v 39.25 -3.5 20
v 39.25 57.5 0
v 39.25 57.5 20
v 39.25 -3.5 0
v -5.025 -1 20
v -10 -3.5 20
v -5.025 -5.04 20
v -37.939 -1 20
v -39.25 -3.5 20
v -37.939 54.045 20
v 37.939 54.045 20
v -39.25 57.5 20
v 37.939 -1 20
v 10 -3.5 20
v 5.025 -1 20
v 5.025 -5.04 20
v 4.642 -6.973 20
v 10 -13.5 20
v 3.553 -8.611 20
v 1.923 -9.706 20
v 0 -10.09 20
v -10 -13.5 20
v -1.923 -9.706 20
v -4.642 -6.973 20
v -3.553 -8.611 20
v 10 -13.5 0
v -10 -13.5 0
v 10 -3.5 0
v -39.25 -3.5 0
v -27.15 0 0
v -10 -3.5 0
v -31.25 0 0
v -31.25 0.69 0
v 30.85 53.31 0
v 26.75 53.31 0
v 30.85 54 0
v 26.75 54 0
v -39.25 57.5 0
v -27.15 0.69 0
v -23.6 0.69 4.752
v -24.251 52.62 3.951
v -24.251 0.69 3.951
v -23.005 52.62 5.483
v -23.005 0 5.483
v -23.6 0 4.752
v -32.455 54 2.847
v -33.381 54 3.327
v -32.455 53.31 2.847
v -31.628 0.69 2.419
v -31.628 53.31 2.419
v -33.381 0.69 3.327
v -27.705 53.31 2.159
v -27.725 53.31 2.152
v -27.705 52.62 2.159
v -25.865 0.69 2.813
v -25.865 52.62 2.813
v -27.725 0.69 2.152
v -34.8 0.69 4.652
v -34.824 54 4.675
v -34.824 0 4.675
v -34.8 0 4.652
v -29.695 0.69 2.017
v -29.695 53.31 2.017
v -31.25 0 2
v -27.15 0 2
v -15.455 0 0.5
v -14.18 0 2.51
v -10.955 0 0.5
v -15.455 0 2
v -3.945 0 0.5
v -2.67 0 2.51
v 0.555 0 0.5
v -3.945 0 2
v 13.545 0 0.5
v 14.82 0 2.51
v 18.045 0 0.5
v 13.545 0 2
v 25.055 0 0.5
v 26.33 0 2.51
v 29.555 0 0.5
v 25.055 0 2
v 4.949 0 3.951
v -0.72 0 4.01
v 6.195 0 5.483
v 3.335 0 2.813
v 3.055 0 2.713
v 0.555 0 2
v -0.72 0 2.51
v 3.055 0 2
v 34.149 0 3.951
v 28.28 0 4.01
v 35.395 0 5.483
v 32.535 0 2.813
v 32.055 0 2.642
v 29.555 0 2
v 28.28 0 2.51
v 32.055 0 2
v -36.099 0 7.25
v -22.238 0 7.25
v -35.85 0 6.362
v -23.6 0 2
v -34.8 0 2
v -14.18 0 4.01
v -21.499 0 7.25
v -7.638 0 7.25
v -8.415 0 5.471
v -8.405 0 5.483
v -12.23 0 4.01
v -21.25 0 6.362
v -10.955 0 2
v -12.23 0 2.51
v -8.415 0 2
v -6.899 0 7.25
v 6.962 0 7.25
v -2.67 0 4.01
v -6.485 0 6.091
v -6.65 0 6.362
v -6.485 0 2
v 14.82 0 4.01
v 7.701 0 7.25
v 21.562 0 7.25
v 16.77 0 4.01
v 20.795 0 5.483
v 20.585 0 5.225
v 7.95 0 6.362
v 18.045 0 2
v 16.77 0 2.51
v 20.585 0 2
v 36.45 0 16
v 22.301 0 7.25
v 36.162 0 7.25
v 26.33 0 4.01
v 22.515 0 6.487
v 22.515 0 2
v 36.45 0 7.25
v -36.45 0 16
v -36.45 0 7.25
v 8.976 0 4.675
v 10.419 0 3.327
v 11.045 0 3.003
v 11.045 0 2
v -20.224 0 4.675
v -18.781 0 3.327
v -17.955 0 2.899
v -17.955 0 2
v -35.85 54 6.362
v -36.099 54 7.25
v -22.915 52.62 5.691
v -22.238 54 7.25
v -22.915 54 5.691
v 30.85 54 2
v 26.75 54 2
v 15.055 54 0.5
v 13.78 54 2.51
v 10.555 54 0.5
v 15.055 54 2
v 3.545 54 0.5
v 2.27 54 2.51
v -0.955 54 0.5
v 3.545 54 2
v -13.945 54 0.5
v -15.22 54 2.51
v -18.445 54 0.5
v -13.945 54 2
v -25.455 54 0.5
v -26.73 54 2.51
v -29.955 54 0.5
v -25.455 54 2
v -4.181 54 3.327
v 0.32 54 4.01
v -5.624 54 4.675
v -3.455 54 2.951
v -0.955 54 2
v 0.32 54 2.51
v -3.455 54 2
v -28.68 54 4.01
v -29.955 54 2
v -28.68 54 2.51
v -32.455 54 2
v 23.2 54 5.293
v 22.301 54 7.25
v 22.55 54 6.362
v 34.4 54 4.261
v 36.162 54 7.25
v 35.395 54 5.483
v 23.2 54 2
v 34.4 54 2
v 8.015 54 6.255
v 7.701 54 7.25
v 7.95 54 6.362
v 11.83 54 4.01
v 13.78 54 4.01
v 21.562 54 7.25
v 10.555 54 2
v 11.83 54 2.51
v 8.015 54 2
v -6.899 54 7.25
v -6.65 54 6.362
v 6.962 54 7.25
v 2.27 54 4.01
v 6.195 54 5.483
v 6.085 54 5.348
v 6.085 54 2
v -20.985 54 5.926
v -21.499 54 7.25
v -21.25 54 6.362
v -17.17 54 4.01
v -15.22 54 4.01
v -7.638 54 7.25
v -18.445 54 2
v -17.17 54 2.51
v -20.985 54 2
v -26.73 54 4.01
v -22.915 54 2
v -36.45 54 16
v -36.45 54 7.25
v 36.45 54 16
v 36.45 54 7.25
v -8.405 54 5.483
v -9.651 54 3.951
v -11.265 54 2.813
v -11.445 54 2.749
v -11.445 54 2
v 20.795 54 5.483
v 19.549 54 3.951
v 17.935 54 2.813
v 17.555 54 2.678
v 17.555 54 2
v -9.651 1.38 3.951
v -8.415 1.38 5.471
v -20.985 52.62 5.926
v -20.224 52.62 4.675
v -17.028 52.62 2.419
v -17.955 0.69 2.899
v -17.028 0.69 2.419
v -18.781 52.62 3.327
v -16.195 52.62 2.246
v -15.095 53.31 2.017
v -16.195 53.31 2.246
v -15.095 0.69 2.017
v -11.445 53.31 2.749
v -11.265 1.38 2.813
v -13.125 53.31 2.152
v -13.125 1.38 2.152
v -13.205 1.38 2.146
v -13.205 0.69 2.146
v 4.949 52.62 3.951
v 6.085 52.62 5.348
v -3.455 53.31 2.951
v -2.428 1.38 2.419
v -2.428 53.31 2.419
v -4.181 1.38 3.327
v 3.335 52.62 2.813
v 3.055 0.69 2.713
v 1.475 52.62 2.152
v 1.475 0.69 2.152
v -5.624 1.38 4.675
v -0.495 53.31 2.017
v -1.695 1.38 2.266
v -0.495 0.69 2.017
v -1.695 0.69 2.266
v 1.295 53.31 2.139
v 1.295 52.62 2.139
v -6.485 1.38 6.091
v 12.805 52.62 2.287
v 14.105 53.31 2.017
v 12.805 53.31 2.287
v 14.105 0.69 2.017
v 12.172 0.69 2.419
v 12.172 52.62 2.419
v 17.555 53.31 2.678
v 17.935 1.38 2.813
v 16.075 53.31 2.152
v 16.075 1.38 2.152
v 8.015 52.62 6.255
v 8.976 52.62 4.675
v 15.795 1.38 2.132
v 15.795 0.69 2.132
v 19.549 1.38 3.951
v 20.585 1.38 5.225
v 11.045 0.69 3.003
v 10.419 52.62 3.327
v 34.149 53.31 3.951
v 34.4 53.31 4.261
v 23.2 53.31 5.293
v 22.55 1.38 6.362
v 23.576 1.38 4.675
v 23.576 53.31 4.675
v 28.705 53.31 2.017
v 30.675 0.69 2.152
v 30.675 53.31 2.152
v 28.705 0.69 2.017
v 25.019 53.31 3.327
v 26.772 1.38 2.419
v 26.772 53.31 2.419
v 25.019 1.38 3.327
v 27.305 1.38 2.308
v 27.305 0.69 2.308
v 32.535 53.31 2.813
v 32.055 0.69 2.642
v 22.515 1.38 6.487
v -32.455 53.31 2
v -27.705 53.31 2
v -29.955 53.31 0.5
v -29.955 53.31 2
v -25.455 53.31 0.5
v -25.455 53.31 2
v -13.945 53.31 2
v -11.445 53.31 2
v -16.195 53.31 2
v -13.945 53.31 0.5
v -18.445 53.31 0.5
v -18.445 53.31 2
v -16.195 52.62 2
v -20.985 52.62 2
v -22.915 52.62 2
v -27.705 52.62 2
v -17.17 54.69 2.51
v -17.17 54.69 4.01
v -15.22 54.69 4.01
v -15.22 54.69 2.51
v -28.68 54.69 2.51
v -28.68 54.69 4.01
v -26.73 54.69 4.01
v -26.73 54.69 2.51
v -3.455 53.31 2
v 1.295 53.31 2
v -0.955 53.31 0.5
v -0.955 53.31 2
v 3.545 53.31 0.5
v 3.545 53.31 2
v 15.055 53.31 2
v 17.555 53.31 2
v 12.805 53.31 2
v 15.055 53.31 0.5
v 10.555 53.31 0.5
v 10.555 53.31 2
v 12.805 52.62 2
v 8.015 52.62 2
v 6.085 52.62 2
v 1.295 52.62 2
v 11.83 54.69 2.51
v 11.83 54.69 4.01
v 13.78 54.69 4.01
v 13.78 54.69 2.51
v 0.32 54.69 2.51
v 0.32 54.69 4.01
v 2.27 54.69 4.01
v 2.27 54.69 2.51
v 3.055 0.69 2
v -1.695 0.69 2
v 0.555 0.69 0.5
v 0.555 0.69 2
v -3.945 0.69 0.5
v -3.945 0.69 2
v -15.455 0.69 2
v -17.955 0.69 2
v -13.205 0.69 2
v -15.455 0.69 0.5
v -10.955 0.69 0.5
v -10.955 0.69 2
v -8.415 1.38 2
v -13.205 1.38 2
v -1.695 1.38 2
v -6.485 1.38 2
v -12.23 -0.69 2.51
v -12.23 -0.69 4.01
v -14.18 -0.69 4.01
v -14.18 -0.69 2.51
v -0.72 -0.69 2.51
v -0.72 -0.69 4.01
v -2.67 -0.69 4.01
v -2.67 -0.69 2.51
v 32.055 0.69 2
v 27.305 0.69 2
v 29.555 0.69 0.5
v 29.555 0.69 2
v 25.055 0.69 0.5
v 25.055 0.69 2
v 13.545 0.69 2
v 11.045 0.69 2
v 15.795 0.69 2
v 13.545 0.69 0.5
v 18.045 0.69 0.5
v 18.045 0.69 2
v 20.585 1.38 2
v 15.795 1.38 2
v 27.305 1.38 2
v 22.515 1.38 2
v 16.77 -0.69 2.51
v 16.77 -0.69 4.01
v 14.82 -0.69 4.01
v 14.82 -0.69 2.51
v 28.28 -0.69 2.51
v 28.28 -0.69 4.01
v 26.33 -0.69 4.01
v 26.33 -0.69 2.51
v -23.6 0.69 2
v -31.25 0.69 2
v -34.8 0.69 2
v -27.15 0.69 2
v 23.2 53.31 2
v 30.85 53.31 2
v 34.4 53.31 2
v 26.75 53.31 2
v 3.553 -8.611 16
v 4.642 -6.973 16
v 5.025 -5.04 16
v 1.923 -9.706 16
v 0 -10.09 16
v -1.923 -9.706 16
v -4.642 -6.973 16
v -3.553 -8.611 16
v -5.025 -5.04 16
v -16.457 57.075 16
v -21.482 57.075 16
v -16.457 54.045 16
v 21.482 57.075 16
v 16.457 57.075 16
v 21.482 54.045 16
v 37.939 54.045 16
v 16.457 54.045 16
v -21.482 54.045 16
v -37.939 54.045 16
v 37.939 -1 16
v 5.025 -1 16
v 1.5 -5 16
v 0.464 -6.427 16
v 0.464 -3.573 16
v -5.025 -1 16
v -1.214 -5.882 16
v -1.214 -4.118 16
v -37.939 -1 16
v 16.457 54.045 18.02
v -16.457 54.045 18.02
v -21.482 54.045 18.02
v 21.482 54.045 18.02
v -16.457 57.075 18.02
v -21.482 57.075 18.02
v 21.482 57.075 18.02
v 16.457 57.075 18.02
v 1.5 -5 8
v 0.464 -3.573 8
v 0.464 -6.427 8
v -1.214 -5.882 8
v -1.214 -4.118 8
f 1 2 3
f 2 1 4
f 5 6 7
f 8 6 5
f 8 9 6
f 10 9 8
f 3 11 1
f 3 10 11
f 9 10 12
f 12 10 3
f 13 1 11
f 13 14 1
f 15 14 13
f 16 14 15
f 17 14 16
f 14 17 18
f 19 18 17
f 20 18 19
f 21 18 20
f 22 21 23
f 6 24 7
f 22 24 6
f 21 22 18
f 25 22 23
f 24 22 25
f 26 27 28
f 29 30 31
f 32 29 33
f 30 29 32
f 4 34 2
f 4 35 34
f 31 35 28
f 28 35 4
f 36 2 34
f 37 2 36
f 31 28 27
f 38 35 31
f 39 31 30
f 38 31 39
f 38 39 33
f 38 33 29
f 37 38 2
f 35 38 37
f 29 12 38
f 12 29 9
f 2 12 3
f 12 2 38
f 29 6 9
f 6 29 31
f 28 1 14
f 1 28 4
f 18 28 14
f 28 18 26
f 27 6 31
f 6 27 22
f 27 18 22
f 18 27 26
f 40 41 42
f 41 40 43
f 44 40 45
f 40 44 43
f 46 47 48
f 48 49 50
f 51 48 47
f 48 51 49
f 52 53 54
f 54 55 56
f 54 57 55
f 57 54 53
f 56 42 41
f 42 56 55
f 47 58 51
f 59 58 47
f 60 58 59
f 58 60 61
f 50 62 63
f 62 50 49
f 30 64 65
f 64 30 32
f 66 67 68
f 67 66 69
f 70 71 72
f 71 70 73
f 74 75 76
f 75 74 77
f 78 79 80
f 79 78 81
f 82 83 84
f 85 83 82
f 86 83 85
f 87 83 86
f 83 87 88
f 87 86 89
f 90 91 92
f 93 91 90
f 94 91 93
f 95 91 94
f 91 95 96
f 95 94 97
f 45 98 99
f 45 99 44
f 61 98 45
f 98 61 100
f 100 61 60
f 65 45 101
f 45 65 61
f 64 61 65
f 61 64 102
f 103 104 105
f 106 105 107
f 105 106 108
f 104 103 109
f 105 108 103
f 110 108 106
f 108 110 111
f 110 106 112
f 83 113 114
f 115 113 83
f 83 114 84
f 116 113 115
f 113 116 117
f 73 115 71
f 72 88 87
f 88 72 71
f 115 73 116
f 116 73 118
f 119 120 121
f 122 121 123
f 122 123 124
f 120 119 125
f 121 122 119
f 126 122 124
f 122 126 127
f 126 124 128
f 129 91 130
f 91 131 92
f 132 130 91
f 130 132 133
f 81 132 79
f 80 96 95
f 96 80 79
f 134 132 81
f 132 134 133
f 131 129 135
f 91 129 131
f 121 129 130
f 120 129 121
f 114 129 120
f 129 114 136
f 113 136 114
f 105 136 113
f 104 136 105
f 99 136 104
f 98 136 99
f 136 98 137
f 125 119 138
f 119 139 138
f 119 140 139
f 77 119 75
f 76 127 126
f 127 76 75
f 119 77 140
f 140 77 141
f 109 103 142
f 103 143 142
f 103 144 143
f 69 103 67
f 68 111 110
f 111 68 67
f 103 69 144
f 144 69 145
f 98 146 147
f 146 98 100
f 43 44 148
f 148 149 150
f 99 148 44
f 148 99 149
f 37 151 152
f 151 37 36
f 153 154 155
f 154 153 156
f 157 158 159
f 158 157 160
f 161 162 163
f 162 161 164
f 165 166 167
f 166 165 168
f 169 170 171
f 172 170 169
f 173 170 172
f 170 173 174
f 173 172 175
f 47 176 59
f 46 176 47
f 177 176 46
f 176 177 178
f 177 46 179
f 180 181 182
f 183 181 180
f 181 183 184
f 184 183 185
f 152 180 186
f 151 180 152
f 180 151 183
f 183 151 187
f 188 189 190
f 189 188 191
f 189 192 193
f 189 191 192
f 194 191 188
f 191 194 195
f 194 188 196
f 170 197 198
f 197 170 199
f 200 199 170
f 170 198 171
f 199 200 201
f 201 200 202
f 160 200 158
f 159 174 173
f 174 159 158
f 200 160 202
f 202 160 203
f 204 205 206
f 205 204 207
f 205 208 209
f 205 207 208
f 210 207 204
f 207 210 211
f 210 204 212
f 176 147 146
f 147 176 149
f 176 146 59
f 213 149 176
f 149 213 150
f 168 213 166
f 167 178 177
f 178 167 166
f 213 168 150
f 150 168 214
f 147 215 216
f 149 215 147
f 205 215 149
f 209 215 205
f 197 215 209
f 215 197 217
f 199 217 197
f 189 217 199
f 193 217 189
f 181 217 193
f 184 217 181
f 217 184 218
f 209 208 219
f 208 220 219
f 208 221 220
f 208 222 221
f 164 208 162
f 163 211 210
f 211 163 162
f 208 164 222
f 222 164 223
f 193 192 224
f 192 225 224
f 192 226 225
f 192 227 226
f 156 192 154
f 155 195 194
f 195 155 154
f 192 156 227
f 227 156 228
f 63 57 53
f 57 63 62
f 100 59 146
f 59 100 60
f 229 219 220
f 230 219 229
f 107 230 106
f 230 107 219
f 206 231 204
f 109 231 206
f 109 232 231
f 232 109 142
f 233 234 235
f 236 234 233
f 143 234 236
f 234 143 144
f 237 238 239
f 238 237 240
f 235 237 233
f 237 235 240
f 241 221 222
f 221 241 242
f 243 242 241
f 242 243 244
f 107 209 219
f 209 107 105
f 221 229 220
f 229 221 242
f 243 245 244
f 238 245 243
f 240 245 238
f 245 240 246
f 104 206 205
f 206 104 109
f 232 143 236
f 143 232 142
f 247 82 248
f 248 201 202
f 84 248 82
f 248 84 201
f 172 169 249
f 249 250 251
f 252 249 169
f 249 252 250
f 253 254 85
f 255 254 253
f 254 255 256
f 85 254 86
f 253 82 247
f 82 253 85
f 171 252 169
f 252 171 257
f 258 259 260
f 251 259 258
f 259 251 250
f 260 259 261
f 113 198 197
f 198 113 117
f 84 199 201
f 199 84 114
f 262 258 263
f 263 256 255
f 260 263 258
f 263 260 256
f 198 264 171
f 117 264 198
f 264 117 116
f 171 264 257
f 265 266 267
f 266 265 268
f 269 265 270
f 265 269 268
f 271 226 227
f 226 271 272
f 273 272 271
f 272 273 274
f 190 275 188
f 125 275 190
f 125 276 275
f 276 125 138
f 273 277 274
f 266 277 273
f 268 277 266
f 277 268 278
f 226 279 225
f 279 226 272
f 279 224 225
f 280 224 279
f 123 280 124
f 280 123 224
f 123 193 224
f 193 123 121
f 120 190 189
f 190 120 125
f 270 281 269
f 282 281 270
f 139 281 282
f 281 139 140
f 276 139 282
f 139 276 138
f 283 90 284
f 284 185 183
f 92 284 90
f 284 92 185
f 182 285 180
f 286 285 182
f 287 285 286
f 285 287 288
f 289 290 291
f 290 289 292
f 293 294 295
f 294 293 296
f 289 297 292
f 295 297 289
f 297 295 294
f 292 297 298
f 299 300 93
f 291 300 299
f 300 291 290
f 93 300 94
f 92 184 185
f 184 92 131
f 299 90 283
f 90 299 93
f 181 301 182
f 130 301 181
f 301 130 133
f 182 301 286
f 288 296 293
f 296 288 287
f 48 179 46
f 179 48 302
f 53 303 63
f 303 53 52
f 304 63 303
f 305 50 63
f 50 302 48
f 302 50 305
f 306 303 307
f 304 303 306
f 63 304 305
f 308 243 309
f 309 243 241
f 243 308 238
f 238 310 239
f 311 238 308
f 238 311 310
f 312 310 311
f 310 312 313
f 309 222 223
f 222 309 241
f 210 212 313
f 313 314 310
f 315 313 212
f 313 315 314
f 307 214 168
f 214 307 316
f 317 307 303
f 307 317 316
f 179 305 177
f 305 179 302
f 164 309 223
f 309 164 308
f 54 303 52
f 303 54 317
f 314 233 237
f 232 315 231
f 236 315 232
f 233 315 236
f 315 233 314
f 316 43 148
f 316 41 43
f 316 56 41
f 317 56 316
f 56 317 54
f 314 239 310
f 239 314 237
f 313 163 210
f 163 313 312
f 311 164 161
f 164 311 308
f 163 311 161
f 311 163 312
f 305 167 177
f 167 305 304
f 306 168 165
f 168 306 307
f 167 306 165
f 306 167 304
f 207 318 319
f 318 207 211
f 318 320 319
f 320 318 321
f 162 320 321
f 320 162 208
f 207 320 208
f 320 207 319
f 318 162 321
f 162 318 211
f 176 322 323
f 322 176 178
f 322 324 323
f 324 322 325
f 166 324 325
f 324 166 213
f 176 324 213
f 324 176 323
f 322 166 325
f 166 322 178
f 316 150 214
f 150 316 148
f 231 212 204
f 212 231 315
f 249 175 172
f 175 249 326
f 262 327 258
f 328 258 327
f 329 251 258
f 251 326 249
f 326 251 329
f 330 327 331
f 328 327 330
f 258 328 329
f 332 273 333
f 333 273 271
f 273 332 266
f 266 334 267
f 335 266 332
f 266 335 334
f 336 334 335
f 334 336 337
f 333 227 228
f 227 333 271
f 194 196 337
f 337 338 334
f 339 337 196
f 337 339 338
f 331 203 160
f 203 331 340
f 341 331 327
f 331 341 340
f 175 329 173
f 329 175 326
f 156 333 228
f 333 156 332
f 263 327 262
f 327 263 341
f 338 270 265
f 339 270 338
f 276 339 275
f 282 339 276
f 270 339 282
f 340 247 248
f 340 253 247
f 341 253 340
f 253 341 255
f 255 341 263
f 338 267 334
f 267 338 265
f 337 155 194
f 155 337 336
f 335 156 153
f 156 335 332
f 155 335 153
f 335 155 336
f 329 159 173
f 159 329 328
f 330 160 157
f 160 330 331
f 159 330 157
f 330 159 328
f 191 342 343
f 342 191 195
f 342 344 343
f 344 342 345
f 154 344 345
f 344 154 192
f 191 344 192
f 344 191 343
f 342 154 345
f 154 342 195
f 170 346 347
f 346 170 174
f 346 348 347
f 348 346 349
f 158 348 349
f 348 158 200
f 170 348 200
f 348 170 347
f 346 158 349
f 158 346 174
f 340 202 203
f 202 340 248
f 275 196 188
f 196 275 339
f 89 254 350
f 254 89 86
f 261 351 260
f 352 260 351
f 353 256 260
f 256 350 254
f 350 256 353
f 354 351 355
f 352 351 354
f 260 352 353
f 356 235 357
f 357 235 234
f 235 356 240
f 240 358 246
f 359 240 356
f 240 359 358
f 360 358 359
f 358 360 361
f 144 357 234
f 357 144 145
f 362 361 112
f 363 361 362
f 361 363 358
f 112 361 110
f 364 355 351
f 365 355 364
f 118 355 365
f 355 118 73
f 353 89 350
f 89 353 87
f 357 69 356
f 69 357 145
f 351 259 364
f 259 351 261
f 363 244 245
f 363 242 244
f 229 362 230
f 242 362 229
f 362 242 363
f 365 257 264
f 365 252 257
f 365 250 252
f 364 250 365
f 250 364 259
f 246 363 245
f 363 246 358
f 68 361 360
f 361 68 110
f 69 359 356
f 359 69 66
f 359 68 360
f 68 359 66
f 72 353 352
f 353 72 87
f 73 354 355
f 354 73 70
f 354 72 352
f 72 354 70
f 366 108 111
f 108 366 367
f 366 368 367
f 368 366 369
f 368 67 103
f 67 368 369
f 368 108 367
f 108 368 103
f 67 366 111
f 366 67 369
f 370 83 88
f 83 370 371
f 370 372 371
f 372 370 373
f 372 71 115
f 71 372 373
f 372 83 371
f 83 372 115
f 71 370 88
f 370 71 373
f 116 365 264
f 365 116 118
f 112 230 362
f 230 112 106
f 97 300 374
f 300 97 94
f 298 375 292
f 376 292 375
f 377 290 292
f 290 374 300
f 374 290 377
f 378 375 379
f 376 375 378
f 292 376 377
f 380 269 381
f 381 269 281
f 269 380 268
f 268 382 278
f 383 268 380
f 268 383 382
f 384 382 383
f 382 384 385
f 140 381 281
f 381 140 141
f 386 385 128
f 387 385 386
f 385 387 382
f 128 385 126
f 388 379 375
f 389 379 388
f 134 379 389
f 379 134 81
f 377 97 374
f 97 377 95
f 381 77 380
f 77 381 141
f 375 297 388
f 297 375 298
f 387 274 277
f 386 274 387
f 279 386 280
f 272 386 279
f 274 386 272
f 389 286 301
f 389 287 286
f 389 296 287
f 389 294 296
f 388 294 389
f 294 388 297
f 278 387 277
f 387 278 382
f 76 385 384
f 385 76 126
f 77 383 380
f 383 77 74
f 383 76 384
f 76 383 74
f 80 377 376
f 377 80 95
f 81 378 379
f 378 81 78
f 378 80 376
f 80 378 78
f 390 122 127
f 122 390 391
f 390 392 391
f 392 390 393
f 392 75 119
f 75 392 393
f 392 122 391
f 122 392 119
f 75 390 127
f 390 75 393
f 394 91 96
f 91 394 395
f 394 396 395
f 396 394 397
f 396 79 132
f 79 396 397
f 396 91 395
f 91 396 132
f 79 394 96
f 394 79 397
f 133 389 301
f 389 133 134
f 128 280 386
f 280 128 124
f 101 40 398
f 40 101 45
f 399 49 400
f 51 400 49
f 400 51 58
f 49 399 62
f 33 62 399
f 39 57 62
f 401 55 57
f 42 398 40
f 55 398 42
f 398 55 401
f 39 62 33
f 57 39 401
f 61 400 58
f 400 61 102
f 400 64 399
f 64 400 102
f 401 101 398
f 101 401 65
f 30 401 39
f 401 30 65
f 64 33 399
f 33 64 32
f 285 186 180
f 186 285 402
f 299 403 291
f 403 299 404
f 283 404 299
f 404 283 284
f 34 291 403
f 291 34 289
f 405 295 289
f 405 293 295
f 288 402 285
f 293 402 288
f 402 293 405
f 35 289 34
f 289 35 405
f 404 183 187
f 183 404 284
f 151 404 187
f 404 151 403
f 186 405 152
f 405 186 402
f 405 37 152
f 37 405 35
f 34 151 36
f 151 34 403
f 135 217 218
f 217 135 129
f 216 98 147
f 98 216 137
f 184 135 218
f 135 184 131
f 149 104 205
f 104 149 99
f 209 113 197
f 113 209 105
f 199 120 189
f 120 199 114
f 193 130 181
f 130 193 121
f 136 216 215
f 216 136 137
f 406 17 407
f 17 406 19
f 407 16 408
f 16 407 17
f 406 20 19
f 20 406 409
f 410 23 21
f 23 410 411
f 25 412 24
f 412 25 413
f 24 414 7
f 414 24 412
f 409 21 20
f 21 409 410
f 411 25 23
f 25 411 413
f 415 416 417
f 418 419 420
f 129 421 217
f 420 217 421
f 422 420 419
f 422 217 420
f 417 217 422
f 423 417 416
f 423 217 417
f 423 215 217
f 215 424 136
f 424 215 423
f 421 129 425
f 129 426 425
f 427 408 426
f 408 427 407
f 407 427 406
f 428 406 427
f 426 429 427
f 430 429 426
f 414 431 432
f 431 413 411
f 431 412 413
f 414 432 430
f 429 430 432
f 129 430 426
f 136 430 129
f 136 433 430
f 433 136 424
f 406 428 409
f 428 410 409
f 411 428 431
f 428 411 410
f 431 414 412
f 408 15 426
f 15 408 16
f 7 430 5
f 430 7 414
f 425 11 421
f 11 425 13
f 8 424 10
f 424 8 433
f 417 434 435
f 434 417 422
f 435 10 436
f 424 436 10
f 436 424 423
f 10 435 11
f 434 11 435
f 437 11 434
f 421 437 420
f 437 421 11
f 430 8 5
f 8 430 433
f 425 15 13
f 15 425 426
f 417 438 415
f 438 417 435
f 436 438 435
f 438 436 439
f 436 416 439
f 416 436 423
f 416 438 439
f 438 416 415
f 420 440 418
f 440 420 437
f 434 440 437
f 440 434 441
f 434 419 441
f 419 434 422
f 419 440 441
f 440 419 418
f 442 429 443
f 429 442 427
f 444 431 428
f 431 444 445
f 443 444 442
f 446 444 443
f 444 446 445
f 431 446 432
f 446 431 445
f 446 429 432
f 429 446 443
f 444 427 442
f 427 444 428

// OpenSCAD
// file: ../libraries/BatteryContacts.scad
/**
 * Digikey Battery Contact Part: 5214K-ND
 * http://www.keyelco.com/product-pdf.cfm?p=894
 */
module BatteryDualContact()
{
	// Overall Properties
	thickness = .69;

	// Lower Tabs
	bottomTabHeight = 1.5;
	bottomTabWidth = 4.50;
	bottomTabDistanceFromCenter = 11.51/2;

	// Body
	overallHeight = 11;
	overallWidth = 21.01;
	mainBodyHeight = overallHeight - bottomTabHeight;


	// Middle Cut
	middleCutWidth = 1.93;
	middleCutHeight = 7.01 - bottomTabHeight;

	// Contacts
	contactDiameter = 5.5;
	contactFromBottom = 7.49 - bottomTabHeight;
	contactFromCenter = 11.51/2;

	// Noch
	nochWidth = 1.95;
	nochHeight = 1.5;
	nochThickness = thickness;
	nochFromCenter = contactFromCenter;
	nochFromBottom = 3.51-bottomTabHeight;

	difference()
	{
		union()
		{
			// Main Body
			translate([-overallWidth/2, 0,0])
				cube([overallWidth, mainBodyHeight,thickness]);
			
			translate([-bottomTabDistanceFromCenter,0,nochThickness])
				cube([bottomTabDistanceFromCenter*2,middleCutHeight, nochThickness]);

			// Bottom Tabs
			translate([-bottomTabWidth/2 - bottomTabDistanceFromCenter,-bottomTabHeight,0])
				cube([bottomTabWidth, bottomTabHeight, thickness]);
			translate([-bottomTabWidth/2 + bottomTabDistanceFromCenter,-bottomTabHeight,0])
				cube([bottomTabWidth, bottomTabHeight, thickness]);

			// Negative Contact
			translate([-contactFromCenter,contactFromBottom,0])
				cylinder(d=contactDiameter, 7.6);

			// Postiive Contact
			translate([contactFromCenter,contactFromBottom,0])
				cylinder(d=contactDiameter, 1.52);

			// Mount Noche
			translate([-nochWidth/2 - nochFromCenter, nochFromBottom-nochHeight, -nochThickness])
				cube([nochWidth, nochHeight, nochThickness]);
			translate([-nochWidth/2 + nochFromCenter, nochFromBottom-nochHeight, -nochThickness])
				cube([nochWidth, nochHeight, nochThickness]);

		}
		
		// Middle Cut
		translate([-middleCutWidth/2,0,0])
			cube([middleCutWidth, middleCutHeight,thickness+nochThickness]);
	}
}

//BatteryDualContact();

/**
 * Digikey Battery Contact Part: 5211K-ND
 * http://www.digikey.com/product-detail/en/5211/5211K-ND/316370
 */
module BatteryDualContactTab()
{
	overallHeight = 18.49;
	thickness = .69;
	tabDiameter = 4.1;
	mainBodyHeight = 11.99;
	tabRectangleHeight = overallHeight - mainBodyHeight - (tabDiameter/2);

	difference()
	{
		union()
		{
			translate([-23.01/2, 0,0])
				cube([23.01, mainBodyHeight,thickness]);
			translate([-tabDiameter/2,-tabRectangleHeight,0])
				cube([tabDiameter, tabRectangleHeight, thickness]);
			translate([0,-tabRectangleHeight,0])
				cylinder(d=tabDiameter,thickness);

			// Negative Contact
			translate([-7,mainBodyHeight-4.5,0])
				cylinder(d=6, 10.52);

			// Postiive Contact
			translate([7,mainBodyHeight-4.5,0])
				cylinder(d=6, 2);
		}
		translate([7,mainBodyHeight-4.5-5.74,0])
			cylinder(d=2.4, 2);
	}
}

//BatteryDualContactTab();

/**
 * Digikey Parts: 5201K-ND and 5223K-ND
 * http://www.keyelco.com/product-pdf.cfm?p=910
 */
module BatterySingleContact()
{
	overallHeight = 18.49;
	thickness = .69;
	tabDiameter = 4.1;
	mainBodyHeight = 11.99;
	tabRectangleHeight = overallHeight - mainBodyHeight - (tabDiameter/2);

	difference()
	{
		union()
		{
			translate([-11.2/2, 0,0])
				cube([11.2, mainBodyHeight,thickness]);
			translate([-tabDiameter/2,-tabRectangleHeight,0])
				cube([tabDiameter, tabRectangleHeight, thickness]);
			translate([0,-tabRectangleHeight,0])
				cylinder(d=tabDiameter,thickness);

			// Contact
			translate([0,mainBodyHeight-5,0])
				cylinder(d=6, 10.52);
		}
		translate([0,mainBodyHeight-5-5.74,0])
			cylinder(d=1.8, 2);
	}
}

//BatterySingleContact();
// file: BatteryBoxCover.scad
/**
 * Module: Battery Box Cover
 * Description:
 *     Battery Box Cover
 */
module BatteryBoxCover(batteryDiameter=15, batteryHeight=55, cells=5, cThickness = 4, tabThickness = 2, screwDiameter =3, headDiameter=6, mountWidth=10, tabWidth=5)
{
	rim = .5;
	width = batteryDiameter * cells + rim;
	length = batteryHeight + rim;

	module batteryTab()
	{
		translate([-tabWidth/2,0,0])
			cube(center=false, size=[tabWidth, 3, cThickness-tabThickness]);
	}

	module screwMount()
	{

		difference()
		{
			union()
			{
				translate([0,mountWidth/2,0])
					cylinder(cThickness, d=mountWidth);

				translate([-mountWidth/2,0,0])
					cube(center=false, size=[mountWidth,mountWidth/2,cThickness]);
			}
			translate([0,5,cThickness/2])
				cylinder(cThickness/2, d=headDiameter);
			translate([0,5,-1])
				cylinder(cThickness+2, d=screwDiameter);
		}
	}

	translate([-width/2, 0,0])
	{
		union()
		{
			// Main Cover
			cube(center=false, size=[width, length, cThickness]);

			// Screw Mount
			translate([width/2,1,0])
				mirror([0,1,0])
					screwMount();

			// Tabs
			translate([width/4,length,0])
				batteryTab();
			translate([3*width/4,length,0])
				batteryTab();
		}
	}
}
//BatteryBoxCover();

module BatteryBoxCoverCavity(batteryHeight=55)
{
	mountWidth=20;
	cThickness=4;
	union()
	{
		scale([1.005, 1.01, 1.01])
			BatteryBoxCover(batteryHeight=batteryHeight);
		translate([0,-4,0])
			union()
			{
				cylinder(cThickness, d=mountWidth/2);
				mirror([0,0,1])
					cylinder(cThickness*2, d=3);
			}
	}
}

//BatteryBoxCoverCavity();
// file: BatteryBox.scad
/**
 * module: BatteryBox
 * description:
 *     Basic Battery Box which holds 4 AA cells
 */

include <BatteryBoxCover.scad>;
include <../libraries/BatteryContacts.scad>;

module BatteryBoxCavity(batteryHeight=55,batteryDiameter=14.5,offset=.1,numBatteries = 5)
{
	function isTop(cells) = cells%2 == 0;
	function numTopContacts(cells) = floor(cells/2);
	function numBottomContacts(cells) = ceil(cells/2);

	batteryCavityWidth = (batteryDiameter+offset)*numBatteries-offset;

	xOffsetTop = numTopContacts(numBatteries)* 2*batteryDiameter + batteryDiameter*0.5;
	xOffsetBottom = numBottomContacts(numBatteries)* 2 * batteryDiameter - batteryDiameter*.5;
	
	mirror([0,0,1])
	translate([-batteryCavityWidth/2,0,-(batteryDiameter+2)])
	{
		cube(size=[batteryCavityWidth, batteryHeight, batteryDiameter/2+2], 
				center=false);	

		// Battery Cells
		for(batNum = [0:numBatteries-1])
		{
			// 1st Battery
			translate([batNum*(offset + batteryDiameter) + batteryDiameter/2,
							0,batteryDiameter/2])
				rotate([-90,0,0])
					cylinder(d=batteryDiameter, h=batteryHeight, center=false);
		}



		// Battery Contacts
		union()
		{
			// Top Battery Connects
			if(numBatteries>1)
			{
				for(contact = [0:numTopContacts(numBatteries)-1])
				{
					translate([contact*2*batteryDiameter + batteryDiameter,
								batteryHeight,batteryDiameter])
							rotate([90,180,0])
								BatteryDualContact();
				}
			}

			// Bottom Battery Connects
			if(numBatteries>2){
				for(contact = [0:ceil(numBatteries/2)-2])
				{
					translate([contact*2*batteryDiameter + 2*batteryDiameter,
									0,batteryDiameter])
						rotate([90,180,180])
							BatteryDualContact();
				}
			}

			// Battery Contacts (Single)
			translate([batteryDiameter*0.5,0,batteryDiameter])
				rotate([90,180,180])
					BatterySingleContact();


			if(isTop(numBatteries))
			{
				translate([xOffsetBottom,0,batteryDiameter])
					rotate([90,180,180])
						BatterySingleContact();	
			} else {
				translate([xOffsetTop, batteryHeight,batteryDiameter])
					rotate([90,180,0])
						BatterySingleContact();	
			}
		}

	}
	
}
//BatteryBoxCavity();

module BatteryBox(batteryHeight=54,numBatteries = 5, boxWallThickness = 3.5)
{
	batteryDiameter=15;
	boxHeight = batteryDiameter+5;
	boxWidth = 15*numBatteries+boxWallThickness;
	boxLength = batteryHeight+boxWallThickness*2;

	translate([-boxWidth/2,-boxWallThickness,0])
			union()
			{	
				cube(size=[boxWidth, boxLength, boxHeight], center=false);	
				translate([boxWidth/2-10, -10,0])
					cube(size=[20,10,boxHeight], center=false);
			}	
		
}

//BatteryBox();
// main file
include <BatteryBox.scad>

module BatteryBoxStandAlone(batteryHeight=54)
{
	batteryDiameter = 15;
	difference()
	{
		BatteryBox(batteryHeight=batteryHeight);
		translate([0,0,0])
			#BatteryBoxCavity(batteryHeight=batteryHeight);
		translate([0,-1,batteryDiameter+1])
			BatteryBoxCoverCavity(batteryHeight=batteryHeight);

	}
}
BatteryBoxStandAlone();
